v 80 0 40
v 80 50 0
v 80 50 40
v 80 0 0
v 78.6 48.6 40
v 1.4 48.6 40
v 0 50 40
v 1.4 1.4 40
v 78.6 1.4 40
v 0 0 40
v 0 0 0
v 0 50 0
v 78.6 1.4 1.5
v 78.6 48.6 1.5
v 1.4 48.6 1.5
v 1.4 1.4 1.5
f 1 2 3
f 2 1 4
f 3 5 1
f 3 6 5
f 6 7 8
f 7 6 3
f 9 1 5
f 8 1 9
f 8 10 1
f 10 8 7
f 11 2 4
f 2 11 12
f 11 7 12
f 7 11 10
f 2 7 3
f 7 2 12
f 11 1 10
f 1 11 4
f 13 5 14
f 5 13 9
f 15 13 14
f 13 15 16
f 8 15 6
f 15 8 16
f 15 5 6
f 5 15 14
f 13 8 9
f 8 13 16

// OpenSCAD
$fn = 32;

// ----------------------------------------------------------------------
// Open box: 1.4 mm walls
// ----------------------------------------------------------------------

// --- parameters (mm) ---
box_l = 80;               // outer length, X
box_w = 50;               // outer width, Y
box_h = 40;               // outer height, Z
wall = 1.4;               // wall thickness
floor = 1.5;              // floor thickness
fit_tol = 0.1;            // tolerance for press fits, mm
free_tol = 0.3;           // tolerance for clearance fits, mm

difference() {
  cube([box_l, box_w, box_h]);
  translate([wall, wall, floor])
    cube([box_l - 2 * wall, box_w - 2 * wall, box_h]);
}
